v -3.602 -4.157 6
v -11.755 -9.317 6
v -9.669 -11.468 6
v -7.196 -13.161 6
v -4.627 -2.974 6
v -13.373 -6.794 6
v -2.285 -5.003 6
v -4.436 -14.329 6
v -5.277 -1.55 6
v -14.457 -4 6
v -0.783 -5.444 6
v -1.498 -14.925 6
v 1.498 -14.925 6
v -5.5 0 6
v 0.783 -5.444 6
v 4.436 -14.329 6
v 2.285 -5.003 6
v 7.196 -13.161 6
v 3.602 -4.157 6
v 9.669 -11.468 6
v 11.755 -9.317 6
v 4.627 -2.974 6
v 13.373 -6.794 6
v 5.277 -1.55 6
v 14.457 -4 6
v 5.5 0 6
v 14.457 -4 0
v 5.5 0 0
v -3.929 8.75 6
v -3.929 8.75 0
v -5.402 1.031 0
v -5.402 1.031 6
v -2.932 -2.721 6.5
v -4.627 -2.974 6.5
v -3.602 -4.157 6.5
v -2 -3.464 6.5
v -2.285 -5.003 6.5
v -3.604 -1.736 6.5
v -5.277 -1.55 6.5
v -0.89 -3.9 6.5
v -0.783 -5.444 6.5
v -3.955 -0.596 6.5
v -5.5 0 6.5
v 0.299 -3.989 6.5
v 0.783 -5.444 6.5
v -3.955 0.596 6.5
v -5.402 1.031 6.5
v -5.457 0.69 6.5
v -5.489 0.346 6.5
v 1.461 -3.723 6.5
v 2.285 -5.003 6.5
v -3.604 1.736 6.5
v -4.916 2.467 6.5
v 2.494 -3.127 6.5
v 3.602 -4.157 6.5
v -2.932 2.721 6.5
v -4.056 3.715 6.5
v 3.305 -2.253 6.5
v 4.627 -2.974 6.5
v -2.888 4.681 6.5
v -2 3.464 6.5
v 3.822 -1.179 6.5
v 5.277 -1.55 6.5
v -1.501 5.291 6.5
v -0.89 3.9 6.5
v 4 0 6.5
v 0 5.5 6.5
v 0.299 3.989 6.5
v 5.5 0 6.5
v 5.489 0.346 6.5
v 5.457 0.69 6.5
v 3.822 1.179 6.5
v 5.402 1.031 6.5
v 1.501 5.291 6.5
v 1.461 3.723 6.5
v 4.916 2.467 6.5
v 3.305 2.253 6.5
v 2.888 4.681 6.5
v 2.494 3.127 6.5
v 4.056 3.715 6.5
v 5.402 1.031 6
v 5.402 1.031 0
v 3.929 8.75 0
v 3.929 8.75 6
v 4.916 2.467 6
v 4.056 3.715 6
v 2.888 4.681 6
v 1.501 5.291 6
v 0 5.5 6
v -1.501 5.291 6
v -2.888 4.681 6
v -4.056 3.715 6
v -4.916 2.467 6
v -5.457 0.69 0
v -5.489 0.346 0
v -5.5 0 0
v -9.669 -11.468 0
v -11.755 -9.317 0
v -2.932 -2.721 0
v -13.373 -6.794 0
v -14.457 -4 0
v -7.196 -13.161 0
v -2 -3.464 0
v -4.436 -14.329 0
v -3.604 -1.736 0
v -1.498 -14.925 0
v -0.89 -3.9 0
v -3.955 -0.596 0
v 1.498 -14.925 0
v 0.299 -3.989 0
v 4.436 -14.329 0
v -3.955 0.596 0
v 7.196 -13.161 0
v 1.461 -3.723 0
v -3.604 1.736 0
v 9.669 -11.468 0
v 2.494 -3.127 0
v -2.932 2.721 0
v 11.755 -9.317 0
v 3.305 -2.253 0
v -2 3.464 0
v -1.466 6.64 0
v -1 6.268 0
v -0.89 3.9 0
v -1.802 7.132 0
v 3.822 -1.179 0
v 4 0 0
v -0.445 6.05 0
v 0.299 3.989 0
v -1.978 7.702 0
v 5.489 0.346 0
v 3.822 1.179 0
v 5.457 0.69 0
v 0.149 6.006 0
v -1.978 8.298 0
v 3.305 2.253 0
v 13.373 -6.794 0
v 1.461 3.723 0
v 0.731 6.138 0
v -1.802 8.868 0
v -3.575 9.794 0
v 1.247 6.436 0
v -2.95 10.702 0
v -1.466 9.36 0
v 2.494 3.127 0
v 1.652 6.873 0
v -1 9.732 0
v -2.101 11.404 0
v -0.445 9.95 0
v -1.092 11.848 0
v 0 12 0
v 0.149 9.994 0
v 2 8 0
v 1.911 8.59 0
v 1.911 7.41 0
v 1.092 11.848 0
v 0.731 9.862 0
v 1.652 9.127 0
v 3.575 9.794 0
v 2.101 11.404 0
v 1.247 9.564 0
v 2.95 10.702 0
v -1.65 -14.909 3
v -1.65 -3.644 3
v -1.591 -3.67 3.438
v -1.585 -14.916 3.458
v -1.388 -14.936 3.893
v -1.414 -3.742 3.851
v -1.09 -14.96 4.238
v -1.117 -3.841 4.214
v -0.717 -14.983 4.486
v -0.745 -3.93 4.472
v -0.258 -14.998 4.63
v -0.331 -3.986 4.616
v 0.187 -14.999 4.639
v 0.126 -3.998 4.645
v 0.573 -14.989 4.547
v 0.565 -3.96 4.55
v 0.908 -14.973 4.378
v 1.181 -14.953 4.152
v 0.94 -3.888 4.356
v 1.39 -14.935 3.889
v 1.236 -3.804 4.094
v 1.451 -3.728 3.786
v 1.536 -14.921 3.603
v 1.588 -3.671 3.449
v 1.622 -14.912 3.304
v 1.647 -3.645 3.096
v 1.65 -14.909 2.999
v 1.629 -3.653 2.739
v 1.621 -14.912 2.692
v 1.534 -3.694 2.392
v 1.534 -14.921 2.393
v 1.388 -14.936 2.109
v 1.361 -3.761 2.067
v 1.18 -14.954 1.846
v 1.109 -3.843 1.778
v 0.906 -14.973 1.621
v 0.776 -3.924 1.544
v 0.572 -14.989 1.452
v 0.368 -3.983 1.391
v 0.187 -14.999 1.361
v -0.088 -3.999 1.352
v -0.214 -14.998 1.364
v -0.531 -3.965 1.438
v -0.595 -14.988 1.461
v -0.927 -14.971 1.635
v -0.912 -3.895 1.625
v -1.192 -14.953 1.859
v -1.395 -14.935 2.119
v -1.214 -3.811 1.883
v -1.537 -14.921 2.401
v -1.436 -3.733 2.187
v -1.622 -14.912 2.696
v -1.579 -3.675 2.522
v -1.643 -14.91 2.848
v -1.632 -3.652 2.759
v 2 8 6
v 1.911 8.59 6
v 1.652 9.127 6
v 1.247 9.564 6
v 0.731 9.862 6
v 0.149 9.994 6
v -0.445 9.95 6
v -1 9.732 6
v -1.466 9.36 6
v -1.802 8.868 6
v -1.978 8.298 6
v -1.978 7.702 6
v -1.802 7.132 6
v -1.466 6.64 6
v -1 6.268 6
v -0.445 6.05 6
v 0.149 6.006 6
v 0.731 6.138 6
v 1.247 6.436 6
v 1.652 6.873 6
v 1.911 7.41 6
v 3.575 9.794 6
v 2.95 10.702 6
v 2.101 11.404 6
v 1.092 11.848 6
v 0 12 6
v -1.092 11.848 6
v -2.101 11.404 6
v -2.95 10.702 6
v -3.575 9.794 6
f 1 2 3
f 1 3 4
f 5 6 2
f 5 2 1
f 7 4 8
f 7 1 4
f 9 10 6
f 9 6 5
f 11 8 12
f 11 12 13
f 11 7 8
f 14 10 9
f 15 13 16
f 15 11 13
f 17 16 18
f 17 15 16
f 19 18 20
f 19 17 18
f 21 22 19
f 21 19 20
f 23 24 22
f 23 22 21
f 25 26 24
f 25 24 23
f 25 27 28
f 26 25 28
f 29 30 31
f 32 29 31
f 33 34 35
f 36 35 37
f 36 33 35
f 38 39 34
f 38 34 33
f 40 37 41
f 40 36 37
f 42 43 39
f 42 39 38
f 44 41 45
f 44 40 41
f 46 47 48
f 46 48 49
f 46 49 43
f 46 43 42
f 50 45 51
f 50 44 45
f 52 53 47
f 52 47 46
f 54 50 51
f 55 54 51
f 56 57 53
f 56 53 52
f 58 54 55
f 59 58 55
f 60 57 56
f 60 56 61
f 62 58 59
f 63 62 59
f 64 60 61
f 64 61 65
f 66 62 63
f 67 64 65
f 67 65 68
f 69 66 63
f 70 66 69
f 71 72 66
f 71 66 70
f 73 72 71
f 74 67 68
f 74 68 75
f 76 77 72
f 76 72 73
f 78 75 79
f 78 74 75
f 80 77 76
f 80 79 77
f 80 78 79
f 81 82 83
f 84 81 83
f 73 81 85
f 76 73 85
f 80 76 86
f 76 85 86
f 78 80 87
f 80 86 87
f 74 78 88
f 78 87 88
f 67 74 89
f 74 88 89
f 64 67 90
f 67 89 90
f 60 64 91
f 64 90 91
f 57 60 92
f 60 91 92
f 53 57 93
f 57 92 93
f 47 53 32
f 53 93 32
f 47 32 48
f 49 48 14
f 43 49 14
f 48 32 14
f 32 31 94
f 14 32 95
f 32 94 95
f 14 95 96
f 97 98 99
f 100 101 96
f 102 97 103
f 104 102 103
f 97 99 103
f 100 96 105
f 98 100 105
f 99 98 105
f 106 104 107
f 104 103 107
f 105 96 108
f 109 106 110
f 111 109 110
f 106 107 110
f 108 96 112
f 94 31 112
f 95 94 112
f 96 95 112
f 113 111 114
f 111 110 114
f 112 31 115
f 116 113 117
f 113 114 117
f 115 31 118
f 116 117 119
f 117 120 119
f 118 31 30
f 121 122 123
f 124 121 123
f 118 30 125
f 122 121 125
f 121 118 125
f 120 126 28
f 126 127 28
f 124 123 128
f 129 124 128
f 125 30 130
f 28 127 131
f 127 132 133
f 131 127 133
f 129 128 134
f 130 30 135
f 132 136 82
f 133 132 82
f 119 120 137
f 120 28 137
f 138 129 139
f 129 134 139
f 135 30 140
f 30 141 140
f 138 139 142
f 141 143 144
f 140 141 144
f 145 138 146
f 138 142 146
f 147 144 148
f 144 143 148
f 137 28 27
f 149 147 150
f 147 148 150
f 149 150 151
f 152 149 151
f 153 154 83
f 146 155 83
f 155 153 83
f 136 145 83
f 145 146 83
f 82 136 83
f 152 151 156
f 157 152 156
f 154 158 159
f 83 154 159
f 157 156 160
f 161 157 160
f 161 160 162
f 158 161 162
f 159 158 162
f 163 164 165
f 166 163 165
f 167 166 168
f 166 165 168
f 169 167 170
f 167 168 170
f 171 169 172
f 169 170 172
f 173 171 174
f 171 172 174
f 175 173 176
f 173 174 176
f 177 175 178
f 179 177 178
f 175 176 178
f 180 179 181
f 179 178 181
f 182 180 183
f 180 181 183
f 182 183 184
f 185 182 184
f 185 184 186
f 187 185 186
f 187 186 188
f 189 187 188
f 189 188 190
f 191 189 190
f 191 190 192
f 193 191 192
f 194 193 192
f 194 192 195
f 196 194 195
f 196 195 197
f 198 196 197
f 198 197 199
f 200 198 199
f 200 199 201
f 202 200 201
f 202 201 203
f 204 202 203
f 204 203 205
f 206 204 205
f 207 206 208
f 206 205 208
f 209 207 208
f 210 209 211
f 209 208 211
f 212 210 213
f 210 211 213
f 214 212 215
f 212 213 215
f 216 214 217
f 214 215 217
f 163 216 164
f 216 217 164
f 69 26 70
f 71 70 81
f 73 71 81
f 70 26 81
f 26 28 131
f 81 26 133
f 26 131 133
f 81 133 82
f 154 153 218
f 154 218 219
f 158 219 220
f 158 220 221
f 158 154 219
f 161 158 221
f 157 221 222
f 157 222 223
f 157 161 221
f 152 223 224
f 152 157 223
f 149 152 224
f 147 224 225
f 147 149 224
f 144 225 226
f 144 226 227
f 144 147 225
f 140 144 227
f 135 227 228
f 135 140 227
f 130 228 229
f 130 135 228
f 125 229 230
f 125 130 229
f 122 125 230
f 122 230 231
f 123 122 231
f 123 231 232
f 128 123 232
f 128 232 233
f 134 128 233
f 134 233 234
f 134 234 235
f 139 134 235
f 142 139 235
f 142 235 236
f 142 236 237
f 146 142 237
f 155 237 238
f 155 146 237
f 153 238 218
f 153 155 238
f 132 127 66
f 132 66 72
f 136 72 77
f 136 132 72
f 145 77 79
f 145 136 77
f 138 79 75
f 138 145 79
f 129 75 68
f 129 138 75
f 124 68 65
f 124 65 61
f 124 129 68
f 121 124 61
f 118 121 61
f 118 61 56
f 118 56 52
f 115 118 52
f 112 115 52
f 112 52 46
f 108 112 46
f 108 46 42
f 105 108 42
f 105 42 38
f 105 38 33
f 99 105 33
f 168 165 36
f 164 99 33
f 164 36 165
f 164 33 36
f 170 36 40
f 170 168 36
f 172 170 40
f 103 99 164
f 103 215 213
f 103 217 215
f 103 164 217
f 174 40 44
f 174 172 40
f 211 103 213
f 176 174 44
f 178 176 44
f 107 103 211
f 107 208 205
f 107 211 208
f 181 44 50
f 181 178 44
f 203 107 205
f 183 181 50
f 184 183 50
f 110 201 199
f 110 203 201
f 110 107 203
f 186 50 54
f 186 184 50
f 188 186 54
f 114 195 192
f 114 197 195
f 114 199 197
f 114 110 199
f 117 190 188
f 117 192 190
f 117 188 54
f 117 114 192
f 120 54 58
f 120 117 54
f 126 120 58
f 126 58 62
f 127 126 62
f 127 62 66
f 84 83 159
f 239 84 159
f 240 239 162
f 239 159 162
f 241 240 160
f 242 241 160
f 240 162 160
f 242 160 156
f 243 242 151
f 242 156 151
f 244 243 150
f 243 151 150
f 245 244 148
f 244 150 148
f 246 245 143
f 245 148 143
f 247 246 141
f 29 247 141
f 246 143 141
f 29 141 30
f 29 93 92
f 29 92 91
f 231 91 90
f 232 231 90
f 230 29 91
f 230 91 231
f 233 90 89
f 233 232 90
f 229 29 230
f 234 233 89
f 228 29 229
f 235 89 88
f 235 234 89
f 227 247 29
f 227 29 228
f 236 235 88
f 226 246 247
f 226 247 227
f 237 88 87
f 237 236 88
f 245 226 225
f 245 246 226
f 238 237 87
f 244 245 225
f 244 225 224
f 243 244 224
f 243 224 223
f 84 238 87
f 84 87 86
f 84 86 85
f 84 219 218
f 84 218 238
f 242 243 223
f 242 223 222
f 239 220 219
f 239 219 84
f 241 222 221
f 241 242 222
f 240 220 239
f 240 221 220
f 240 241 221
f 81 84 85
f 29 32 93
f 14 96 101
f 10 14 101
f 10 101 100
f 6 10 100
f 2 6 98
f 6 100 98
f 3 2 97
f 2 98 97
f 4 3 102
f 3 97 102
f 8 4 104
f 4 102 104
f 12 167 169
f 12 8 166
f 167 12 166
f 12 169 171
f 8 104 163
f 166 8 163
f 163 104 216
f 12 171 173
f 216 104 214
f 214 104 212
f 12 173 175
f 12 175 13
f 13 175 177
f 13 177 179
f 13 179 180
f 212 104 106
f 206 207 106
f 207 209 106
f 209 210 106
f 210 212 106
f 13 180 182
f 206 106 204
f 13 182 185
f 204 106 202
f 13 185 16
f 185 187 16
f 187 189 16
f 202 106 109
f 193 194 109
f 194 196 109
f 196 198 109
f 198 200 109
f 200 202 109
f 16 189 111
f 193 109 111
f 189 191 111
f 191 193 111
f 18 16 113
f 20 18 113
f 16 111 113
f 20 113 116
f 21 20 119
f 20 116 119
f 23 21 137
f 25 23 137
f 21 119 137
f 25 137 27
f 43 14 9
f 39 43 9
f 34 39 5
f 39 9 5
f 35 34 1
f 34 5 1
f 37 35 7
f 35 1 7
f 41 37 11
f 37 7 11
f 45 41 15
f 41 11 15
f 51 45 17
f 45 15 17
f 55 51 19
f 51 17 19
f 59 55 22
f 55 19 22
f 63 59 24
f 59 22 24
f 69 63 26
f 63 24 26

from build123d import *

# Parameters (mm, degrees)
F0_R     = 4
F2_DEPTH = 6.5
F0_R_2   = 2
F3_DEPTH = 6
F5_D     = 3.3
F5_DEPTH = 15
F5_TIP   = 0.9914200214


with BuildPart() as f2:
    # F0 (on Top) → F2 (new body)
    with BuildSketch(Plane.XY):
        with BuildLine():
            ThreePointArc((-5.5, 0), (0, -5.5), (5.5, 0))
            ThreePointArc((5.5, 0), (5.4755595256, 0.5179265218), (5.4024553156, 1.03125))
            ThreePointArc((5.4024553156, 1.03125), (0, 5.5), (-5.4024553156, 1.03125))
            ThreePointArc((-5.4024553156, 1.03125), (-5.4755595256, 0.5179265218), (-5.5, 0))
        make_face()
        Circle(F0_R, mode=Mode.SUBTRACT)
    extrude(amount=F2_DEPTH)

    # F0 (on Top) → F3 (join)
    with BuildSketch(Plane.XY):
        with BuildLine():
            ThreePointArc((-5.4024553156, 1.03125), (0, 5.5), (5.4024553156, 1.03125))
            Line((5.4024553156, 1.03125), (3.9290584114, 8.75))
            ThreePointArc((3.9290584114, 8.75), (0, 12), (-3.9290584114, 8.75))
            Line((-3.9290584114, 8.75), (-5.4024553156, 1.03125))
        make_face()
        with Locations((0, 8)):
            Circle(F0_R_2, mode=Mode.SUBTRACT)
        with BuildLine():
            Line((14.4568322948, -4), (5.5, 0))
            ThreePointArc((5.5, 0), (0, -5.5), (-5.5, 0))
            Line((-5.5, 0), (-14.4568322948, -4))
            ThreePointArc((-14.4568322948, -4), (0, -15), (14.4568322948, -4))
        make_face()
    extrude(amount=F3_DEPTH)

    # F5
    with Locations(Plane.XZ.offset(15)):
        with Locations((0, 3)):
            Hole(F5_D / 2, depth=F5_DEPTH)
            with Locations((0, 0, -(F5_DEPTH + F5_TIP / 2))):  # 118° drill point
                Cone(0, F5_D / 2, F5_TIP, mode=Mode.SUBTRACT)


solid = f2.part
